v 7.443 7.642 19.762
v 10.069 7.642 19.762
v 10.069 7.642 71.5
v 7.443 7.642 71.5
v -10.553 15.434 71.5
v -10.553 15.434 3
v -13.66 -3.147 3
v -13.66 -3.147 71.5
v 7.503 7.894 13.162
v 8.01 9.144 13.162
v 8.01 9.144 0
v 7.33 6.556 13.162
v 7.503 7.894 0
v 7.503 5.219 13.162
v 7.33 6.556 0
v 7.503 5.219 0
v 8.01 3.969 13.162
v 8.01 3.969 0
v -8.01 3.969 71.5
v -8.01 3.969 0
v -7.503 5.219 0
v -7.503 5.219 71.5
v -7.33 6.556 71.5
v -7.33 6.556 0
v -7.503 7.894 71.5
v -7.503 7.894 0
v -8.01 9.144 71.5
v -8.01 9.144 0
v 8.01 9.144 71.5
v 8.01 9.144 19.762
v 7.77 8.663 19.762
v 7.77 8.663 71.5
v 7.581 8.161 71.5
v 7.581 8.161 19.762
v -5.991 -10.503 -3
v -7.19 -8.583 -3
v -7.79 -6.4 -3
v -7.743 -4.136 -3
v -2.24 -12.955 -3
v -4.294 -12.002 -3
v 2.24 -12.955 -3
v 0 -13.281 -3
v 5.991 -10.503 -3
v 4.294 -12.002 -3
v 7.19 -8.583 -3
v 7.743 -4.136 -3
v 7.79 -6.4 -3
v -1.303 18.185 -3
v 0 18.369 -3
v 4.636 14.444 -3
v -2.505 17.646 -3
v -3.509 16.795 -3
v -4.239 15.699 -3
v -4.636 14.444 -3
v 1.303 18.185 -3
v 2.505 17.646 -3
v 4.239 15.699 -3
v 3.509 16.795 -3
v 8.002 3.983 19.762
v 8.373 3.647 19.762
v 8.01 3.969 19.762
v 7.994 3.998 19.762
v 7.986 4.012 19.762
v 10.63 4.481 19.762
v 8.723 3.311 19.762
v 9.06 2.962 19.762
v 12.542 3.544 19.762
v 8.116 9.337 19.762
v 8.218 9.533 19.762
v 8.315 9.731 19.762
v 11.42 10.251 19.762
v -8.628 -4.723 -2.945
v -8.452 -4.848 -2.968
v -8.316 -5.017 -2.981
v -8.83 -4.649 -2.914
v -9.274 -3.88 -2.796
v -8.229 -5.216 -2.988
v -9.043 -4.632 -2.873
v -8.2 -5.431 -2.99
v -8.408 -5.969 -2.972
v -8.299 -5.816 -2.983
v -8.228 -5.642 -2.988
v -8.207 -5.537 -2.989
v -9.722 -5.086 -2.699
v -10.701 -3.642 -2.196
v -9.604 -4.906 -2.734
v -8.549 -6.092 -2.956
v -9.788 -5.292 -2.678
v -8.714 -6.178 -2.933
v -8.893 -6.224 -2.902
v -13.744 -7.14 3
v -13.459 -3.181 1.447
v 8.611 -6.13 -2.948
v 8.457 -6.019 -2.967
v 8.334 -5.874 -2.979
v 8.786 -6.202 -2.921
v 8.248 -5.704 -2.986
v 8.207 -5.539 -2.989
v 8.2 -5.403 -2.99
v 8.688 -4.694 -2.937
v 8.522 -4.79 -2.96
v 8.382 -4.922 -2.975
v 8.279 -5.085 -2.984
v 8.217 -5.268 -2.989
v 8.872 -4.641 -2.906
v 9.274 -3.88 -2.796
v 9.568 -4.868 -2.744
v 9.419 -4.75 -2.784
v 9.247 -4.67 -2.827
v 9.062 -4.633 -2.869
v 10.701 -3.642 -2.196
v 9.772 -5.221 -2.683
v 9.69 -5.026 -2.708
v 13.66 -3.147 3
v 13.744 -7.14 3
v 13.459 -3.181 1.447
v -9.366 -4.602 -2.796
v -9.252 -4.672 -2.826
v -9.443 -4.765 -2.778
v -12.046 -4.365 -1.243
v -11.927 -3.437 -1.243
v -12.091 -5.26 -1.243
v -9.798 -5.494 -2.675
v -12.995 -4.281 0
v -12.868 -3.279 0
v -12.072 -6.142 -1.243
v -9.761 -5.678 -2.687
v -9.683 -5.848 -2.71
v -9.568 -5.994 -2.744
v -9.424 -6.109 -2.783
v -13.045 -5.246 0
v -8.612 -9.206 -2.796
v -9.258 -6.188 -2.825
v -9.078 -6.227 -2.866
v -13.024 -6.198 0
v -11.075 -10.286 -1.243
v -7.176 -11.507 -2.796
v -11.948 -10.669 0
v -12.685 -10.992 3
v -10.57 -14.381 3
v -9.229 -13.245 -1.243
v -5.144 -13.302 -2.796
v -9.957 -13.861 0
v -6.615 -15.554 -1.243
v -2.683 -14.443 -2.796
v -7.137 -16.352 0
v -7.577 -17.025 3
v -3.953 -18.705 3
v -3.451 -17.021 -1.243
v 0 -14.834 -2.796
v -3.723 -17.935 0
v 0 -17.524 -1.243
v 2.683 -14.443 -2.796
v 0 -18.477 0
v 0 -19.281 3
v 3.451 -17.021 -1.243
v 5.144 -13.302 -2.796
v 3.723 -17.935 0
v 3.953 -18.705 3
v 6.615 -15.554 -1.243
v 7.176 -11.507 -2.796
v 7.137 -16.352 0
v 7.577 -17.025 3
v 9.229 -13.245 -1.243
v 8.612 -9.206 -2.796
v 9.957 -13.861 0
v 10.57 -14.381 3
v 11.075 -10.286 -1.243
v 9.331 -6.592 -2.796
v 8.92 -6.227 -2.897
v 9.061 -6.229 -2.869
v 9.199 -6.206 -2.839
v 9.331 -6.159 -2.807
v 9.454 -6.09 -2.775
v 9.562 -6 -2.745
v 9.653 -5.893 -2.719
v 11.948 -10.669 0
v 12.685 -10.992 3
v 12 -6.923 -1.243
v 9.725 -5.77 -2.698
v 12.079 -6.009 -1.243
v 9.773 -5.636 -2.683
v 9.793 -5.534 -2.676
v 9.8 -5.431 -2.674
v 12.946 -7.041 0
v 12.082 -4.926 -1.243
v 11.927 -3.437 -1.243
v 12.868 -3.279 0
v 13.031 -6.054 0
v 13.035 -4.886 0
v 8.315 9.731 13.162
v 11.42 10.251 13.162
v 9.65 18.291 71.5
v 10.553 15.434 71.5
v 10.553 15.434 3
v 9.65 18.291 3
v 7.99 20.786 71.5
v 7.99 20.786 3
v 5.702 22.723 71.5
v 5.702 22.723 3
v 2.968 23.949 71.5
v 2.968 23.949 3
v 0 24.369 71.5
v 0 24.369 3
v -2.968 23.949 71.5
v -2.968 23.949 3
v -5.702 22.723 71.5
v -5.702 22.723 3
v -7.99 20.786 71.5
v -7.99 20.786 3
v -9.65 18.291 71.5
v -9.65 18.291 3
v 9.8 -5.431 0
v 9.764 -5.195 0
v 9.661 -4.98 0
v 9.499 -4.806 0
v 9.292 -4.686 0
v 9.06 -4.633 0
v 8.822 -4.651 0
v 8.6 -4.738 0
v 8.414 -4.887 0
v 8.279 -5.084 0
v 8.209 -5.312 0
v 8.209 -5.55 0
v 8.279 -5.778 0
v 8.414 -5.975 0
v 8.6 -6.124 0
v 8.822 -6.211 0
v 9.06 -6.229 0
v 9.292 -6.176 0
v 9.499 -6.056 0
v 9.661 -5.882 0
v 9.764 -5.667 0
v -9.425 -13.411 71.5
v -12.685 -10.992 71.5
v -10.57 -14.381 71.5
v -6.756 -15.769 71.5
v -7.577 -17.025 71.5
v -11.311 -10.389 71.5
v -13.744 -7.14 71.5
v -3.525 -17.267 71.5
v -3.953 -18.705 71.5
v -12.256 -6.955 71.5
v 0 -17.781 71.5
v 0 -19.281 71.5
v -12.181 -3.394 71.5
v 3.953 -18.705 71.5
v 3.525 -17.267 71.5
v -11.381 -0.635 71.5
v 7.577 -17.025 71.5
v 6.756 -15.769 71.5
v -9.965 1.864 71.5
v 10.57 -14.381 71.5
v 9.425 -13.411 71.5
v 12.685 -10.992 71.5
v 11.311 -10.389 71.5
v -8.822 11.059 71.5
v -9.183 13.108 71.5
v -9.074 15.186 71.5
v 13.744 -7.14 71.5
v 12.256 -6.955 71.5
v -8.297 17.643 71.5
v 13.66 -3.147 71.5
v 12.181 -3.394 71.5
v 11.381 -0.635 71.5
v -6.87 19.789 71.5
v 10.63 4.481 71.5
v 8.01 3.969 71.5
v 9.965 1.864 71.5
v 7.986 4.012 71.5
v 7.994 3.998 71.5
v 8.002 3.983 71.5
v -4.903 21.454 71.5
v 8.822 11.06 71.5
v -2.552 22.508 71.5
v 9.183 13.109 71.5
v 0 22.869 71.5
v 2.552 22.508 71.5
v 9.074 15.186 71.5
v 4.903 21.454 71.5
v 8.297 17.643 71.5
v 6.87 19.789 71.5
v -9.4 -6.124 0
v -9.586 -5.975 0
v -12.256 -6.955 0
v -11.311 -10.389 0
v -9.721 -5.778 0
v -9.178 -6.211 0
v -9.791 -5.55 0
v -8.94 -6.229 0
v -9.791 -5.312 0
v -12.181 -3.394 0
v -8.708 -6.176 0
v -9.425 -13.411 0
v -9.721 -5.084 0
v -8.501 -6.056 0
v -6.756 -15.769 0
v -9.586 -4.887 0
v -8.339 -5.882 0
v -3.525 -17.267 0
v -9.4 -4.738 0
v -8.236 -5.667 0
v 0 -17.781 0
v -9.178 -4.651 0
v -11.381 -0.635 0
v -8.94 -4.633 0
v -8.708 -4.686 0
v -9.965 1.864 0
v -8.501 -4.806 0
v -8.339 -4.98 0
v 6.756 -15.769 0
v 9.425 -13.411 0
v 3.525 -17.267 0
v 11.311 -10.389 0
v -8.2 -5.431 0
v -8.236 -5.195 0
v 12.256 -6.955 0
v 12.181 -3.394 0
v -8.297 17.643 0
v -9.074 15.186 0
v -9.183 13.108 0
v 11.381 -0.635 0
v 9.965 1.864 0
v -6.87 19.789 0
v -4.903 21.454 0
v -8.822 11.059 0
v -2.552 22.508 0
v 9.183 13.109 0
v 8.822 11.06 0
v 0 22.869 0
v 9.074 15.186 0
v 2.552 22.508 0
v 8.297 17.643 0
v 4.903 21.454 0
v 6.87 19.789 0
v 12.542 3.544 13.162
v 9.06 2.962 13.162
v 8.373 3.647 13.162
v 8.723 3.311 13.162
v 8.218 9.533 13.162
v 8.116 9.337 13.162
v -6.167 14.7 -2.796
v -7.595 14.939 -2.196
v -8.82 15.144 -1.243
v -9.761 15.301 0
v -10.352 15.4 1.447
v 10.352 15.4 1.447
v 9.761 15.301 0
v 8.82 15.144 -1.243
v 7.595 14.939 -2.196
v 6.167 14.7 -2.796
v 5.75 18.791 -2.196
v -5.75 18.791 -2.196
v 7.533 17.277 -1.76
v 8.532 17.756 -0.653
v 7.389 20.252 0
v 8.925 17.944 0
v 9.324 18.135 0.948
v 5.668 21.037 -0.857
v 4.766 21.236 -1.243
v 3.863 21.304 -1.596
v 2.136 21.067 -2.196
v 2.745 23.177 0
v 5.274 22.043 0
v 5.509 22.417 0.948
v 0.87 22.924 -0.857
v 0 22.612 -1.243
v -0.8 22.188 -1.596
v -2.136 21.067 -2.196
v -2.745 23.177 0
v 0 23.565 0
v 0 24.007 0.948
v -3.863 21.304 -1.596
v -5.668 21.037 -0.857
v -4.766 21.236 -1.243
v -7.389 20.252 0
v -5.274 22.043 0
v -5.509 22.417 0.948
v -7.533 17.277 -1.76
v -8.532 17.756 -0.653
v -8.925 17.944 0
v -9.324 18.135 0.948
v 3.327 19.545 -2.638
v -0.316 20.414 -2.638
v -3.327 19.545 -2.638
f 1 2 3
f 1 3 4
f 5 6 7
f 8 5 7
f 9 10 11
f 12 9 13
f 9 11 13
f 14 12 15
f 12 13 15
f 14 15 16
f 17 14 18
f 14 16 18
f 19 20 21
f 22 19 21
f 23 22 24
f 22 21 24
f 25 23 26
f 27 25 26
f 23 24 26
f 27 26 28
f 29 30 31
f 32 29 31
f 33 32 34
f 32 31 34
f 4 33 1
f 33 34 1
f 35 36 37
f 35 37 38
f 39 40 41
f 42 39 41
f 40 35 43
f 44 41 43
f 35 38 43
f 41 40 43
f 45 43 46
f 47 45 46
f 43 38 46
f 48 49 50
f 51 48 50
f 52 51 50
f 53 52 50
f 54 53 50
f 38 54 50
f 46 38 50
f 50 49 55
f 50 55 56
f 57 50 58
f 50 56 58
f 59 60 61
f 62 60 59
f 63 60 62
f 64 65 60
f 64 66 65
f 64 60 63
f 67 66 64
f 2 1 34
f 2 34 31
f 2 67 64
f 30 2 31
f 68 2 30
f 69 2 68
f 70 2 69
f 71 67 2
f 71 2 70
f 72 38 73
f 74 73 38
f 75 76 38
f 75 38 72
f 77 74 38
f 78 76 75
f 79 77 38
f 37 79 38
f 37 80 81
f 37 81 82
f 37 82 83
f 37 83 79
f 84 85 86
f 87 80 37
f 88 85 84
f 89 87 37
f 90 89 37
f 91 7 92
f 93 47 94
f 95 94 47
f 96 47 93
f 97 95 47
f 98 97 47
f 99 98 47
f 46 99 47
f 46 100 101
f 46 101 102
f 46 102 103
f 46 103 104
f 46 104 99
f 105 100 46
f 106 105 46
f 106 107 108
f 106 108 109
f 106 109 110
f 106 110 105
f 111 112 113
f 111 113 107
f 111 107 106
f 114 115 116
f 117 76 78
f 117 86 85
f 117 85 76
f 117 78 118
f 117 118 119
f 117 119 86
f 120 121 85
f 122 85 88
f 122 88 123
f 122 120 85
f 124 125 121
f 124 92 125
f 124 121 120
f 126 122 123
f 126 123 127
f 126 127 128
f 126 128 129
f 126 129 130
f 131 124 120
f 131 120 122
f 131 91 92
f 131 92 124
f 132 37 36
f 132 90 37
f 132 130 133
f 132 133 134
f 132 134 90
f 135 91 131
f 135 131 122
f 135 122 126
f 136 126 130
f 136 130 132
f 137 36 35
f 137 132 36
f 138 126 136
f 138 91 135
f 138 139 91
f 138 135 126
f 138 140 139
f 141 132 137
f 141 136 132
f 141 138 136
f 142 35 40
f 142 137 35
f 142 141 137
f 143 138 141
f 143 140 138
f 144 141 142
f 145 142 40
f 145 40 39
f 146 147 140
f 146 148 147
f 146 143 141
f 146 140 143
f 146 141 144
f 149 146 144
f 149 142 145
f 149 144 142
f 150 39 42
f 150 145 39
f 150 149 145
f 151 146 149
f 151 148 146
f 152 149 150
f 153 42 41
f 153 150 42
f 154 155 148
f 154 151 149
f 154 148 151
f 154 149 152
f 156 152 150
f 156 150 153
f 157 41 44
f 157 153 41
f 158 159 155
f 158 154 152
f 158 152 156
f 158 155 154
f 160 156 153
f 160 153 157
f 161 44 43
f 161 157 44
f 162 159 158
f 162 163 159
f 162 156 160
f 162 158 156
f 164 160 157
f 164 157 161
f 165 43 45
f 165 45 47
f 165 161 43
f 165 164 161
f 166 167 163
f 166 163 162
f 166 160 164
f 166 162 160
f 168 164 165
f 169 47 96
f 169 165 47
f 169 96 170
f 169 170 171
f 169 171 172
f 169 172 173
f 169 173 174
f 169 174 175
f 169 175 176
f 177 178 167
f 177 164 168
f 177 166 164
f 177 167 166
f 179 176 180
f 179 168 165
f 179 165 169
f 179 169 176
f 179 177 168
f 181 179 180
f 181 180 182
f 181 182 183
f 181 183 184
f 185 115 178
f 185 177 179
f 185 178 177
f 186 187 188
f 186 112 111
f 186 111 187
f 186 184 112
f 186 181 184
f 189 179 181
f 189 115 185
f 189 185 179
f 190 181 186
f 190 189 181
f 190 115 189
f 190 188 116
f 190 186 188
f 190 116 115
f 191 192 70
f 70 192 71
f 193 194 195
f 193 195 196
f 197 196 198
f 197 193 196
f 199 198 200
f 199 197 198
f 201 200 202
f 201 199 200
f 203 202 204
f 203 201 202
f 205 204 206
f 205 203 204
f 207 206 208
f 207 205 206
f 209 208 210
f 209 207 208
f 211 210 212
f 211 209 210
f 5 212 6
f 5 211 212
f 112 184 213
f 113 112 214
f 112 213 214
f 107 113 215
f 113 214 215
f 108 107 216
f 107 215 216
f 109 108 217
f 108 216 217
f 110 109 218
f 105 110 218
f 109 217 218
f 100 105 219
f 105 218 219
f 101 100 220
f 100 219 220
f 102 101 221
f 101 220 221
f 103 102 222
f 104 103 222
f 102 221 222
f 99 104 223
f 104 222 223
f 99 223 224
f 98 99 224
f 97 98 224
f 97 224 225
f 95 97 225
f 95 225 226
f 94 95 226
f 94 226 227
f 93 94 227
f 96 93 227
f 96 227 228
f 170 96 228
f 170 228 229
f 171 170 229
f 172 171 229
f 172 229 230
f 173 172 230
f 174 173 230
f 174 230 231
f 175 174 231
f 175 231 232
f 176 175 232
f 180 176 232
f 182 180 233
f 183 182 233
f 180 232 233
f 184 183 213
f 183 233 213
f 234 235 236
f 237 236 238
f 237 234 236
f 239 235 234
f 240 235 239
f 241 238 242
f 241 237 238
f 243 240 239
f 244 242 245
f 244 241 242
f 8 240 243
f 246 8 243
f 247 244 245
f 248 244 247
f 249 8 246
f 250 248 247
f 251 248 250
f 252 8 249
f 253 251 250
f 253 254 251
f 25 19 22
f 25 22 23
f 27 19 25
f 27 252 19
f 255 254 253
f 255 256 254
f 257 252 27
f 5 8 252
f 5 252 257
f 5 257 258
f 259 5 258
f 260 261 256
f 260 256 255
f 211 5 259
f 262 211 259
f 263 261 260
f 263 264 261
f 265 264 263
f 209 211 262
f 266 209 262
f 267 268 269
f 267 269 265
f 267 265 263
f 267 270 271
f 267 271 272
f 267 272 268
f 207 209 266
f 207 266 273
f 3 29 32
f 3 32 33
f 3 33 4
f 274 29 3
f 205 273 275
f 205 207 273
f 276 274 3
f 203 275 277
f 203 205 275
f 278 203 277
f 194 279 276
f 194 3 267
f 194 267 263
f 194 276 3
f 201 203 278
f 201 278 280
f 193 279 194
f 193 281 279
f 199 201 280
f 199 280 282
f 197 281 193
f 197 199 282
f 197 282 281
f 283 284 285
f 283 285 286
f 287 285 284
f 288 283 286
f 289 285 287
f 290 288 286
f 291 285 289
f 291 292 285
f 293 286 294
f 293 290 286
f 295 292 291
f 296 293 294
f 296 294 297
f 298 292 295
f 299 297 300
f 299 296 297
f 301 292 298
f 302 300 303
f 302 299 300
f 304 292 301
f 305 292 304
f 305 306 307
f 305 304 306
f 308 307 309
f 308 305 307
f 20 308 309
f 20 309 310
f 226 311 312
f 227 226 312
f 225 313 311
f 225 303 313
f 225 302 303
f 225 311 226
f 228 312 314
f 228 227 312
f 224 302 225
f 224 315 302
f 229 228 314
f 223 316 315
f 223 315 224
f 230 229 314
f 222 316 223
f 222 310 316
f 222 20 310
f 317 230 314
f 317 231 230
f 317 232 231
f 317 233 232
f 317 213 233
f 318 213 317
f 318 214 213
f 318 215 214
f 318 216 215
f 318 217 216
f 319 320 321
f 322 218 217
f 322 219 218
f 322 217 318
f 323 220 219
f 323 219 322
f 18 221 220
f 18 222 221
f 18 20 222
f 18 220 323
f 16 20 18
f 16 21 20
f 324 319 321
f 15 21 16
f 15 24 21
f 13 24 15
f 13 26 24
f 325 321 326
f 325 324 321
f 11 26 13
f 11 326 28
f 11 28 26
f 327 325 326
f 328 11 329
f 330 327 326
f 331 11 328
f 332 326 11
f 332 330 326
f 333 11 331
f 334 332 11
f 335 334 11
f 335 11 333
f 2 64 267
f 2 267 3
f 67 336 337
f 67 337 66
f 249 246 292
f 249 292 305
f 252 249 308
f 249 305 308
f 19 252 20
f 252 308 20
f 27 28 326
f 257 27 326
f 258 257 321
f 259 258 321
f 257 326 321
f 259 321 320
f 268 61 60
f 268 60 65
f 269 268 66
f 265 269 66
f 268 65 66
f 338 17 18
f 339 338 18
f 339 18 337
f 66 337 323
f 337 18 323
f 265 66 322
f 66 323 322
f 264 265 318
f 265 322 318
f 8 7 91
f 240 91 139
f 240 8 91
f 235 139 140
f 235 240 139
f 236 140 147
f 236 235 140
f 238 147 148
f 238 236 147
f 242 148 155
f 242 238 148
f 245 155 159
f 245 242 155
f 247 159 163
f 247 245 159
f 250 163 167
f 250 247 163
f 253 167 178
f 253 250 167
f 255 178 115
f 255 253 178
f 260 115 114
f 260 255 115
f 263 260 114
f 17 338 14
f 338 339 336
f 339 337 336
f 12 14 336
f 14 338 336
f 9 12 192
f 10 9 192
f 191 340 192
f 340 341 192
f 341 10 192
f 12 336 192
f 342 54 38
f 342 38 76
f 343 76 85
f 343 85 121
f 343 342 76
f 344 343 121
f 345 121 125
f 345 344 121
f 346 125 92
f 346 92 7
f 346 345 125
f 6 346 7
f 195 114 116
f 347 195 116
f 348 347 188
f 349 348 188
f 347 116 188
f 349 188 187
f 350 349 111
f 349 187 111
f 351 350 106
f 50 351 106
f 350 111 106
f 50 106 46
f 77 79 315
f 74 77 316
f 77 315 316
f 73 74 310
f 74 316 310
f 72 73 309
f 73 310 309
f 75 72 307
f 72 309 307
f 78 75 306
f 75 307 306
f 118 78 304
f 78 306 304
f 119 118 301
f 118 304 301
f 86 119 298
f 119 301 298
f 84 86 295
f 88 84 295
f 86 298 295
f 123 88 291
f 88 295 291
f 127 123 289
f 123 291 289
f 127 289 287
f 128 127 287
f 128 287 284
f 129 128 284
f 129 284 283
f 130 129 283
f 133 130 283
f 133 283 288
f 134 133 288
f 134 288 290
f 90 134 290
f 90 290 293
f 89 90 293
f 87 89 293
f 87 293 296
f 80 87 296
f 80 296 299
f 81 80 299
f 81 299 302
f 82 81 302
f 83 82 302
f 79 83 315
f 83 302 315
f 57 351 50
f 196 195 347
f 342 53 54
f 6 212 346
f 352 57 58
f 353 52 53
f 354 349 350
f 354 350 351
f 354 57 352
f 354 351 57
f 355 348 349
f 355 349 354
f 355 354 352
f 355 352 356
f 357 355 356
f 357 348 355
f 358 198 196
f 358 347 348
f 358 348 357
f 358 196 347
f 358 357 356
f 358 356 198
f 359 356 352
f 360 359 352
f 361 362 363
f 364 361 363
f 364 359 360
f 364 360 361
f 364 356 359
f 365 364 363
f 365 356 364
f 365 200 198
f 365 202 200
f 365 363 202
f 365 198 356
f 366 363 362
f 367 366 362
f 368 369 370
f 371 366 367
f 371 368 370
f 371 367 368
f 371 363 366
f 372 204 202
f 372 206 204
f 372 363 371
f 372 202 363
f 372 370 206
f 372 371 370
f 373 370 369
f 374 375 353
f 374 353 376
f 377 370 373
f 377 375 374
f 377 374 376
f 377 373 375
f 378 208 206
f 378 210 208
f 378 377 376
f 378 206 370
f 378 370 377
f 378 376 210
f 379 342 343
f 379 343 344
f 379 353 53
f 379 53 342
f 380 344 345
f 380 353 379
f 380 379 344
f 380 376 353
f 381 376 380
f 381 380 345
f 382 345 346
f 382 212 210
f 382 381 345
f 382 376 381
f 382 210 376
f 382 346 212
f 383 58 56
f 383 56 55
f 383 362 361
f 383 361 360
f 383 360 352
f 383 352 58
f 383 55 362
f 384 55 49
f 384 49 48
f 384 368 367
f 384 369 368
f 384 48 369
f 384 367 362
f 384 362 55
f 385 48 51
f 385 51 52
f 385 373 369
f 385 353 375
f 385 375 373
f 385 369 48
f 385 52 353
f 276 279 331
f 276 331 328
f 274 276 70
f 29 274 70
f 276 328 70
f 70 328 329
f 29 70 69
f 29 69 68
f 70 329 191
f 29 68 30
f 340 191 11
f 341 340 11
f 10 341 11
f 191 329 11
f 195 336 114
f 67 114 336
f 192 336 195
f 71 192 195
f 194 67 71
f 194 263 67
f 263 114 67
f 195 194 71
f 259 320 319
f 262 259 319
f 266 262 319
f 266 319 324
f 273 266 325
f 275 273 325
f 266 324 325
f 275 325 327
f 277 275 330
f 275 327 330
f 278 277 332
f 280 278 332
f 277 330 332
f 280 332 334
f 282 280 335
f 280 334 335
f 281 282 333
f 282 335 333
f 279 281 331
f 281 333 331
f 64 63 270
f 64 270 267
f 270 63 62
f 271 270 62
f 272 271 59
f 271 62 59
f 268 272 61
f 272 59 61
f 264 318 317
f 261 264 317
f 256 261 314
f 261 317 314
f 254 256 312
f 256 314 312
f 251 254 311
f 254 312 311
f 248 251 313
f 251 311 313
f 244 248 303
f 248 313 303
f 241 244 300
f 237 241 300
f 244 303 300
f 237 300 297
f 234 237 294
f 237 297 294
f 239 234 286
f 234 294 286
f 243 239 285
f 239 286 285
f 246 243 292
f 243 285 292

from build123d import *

# Parameters (mm, degrees)
F1_DEPTH    = 71.5
F0_R        = 0.8
F2_DEPTH    = 3
F3_T1_DEPTH = 18.8384580048
F3_T3_DEPTH = 18.8384580048
F3_T6_ANGLE = 198.9853445977
F3_T8_ANGLE = 161.0146554023
F6_W        = 6.8
F6_H        = 6.6
F7_DEPTH    = 10
F9_DEPTH    = 57.4


# Not quite as in the source:
# - a fillet or chamfer that OpenCascade refuses, or shapes differently, is made with other operations: its cross-section is extruded or revolved along the edge and cut away or added


with BuildPart() as f1:
    # F0 (on Top) → F1 (new body)
    with BuildSketch(Plane.XY):
        with BuildLine():
            ThreePointArc((10.5534817095, 15.4336250836), (0, 24.3689653978), (-10.5534817095, 15.4336250836))
            Line((-10.5534817095, 15.4336250836), (-13.6603478203, -3.1468722986))
            ThreePointArc((-13.6603478203, -3.1468722986), (0, -19.2810346022), (13.6603478203, -3.1468722986))
            Line((13.6603478203, -3.1468722986), (10.5534817095, 15.4336250836))
        make_face()
        with BuildLine():
            ThreePointArc((-12.1808877675, -3.3942544975), (-10.7458713669, 0.6557337165), (-8.0101498113, 3.9689653978))
            ThreePointArc((-8.0101498113, 3.9689653978), (-7.3298242511, 6.556361809), (-8.0101498113, 9.1437582202))
            ThreePointArc((-8.0101498113, 9.1437582202), (-9.0606365073, 12.0737017575), (-9.0740216568, 15.1862428847))
            ThreePointArc((-9.0740216568, 15.1862428847), (0, 22.8689653978), (9.0740216568, 15.1862428847))
            ThreePointArc((9.0740216568, 15.1862428847), (9.0606535532, 12.0737985759), (8.0102465186, 9.1439294077))
            ThreePointArc((8.0102465186, 9.1439294077), (8.0101981654, 9.1438438137), (8.0101498113, 9.1437582202))
            ThreePointArc((8.0101498113, 9.1437582202), (7.3298242511, 6.556361809), (8.0101498113, 3.9689653978))
            ThreePointArc((8.0101498113, 3.9689653978), (10.7458713669, 0.6557337165), (12.1808877675, -3.3942544975))
            ThreePointArc((12.1808877675, -3.3942544975), (0, -17.7810346022), (-12.1808877675, -3.3942544975))
        make_face(mode=Mode.SUBTRACT)
    extrude(amount=F1_DEPTH)

    # F0 (on Top) → F2 (join)
    with BuildSketch(Plane.XY):
        with BuildLine():
            ThreePointArc((10.5534817095, 15.4336250836), (0, 24.3689653978), (-10.5534817095, 15.4336250836))
            Line((-10.5534817095, 15.4336250836), (-13.6603478203, -3.1468722986))
            ThreePointArc((-13.6603478203, -3.1468722986), (0, -19.2810346022), (13.6603478203, -3.1468722986))
            Line((13.6603478203, -3.1468722986), (10.5534817095, 15.4336250836))
        make_face()
        with BuildLine():
            ThreePointArc((-12.1808877675, -3.3942544975), (-10.7458713669, 0.6557337165), (-8.0101498113, 3.9689653978))
            ThreePointArc((-8.0101498113, 3.9689653978), (-7.3298242511, 6.556361809), (-8.0101498113, 9.1437582202))
            ThreePointArc((-8.0101498113, 9.1437582202), (-9.0606365073, 12.0737017575), (-9.0740216568, 15.1862428847))
            ThreePointArc((-9.0740216568, 15.1862428847), (0, 22.8689653978), (9.0740216568, 15.1862428847))
            ThreePointArc((9.0740216568, 15.1862428847), (9.0606535532, 12.0737985759), (8.0102465186, 9.1439294077))
            ThreePointArc((8.0102465186, 9.1439294077), (8.0101981654, 9.1438438137), (8.0101498113, 9.1437582202))
            ThreePointArc((8.0101498113, 9.1437582202), (7.3298242511, 6.556361809), (8.0101498113, 3.9689653978))
            ThreePointArc((8.0101498113, 3.9689653978), (10.7458713669, 0.6557337165), (12.1808877675, -3.3942544975))
            ThreePointArc((12.1808877675, -3.3942544975), (0, -17.7810346022), (-12.1808877675, -3.3942544975))
        make_face(mode=Mode.SUBTRACT)
        with BuildLine():
            ThreePointArc((-9.0740216568, 15.1862428847), (-9.0606365073, 12.0737017575), (-8.0101498113, 9.1437582202))
            ThreePointArc((-8.0101498113, 9.1437582202), (0, 4.4689653978), (8.0101498113, 9.1437582202))
            ThreePointArc((8.0101498113, 9.1437582202), (8.0101981654, 9.1438438137), (8.0102465186, 9.1439294077))
            ThreePointArc((8.0102465186, 9.1439294077), (9.0606535532, 12.0737985759), (9.0740216568, 15.1862428847))
            ThreePointArc((9.0740216568, 15.1862428847), (0, 22.8689653978), (-9.0740216568, 15.1862428847))
        make_face()
        with BuildLine():
            ThreePointArc((-8.0101498113, 9.1437582202), (-7.3298242511, 6.556361809), (-8.0101498113, 3.9689653978))
            Line((-8.0101498113, 3.9689653978), (8.0101498113, 3.9689653978))
            ThreePointArc((8.0101498113, 3.9689653978), (7.3298242511, 6.556361809), (8.0101498113, 9.1437582202))
            ThreePointArc((8.0101498113, 9.1437582202), (0, 4.4689653978), (-8.0101498113, 9.1437582202))
        make_face()
        with BuildLine():
            Line((8.0101498113, 3.9689653978), (-8.0101498113, 3.9689653978))
            ThreePointArc((-8.0101498113, 3.9689653978), (-10.7458713669, 0.6557337165), (-12.1808877675, -3.3942544975))
            ThreePointArc((-12.1808877675, -3.3942544975), (0, -17.7810346022), (12.1808877675, -3.3942544975))
            ThreePointArc((12.1808877675, -3.3942544975), (10.7458713669, 0.6557337165), (8.0101498113, 3.9689653978))
        make_face()
        with Locations((-9, -5.4310346022)):
            Circle(F0_R, mode=Mode.SUBTRACT)
        with Locations((9, -5.4310346022)):
            Circle(F0_R, mode=Mode.SUBTRACT)
    extrude(amount=-F2_DEPTH)

    # F3: fillet of radius 6 on 1 edges, made by hand

    # F3_s2 → F3_t1 (cut)
    with BuildSketch(Plane(origin=(2.22343693, 13.2971819786, 0), x_dir=(0, 0, 1), z_dir=(-0.164921466, -0.9863067018, 0))):
        with BuildLine():
            ThreePointArc((-3, 6.9543058117), (-1.2426406871, 11.1969464988), (3, 12.9543058117))
            Line((3, 12.9543058117), (-3, 12.9543058117))
            Line((-3, 12.9543058117), (-3, 6.9543058117))
        make_face()
    extrude(amount=F3_T1_DEPTH, mode=Mode.SUBTRACT)

    # F3_s4 → F3_t3 (cut)
    with BuildSketch(Plane(origin=(0.8834291807, -5.2833154036, 0), x_dir=(0, 0, 1), z_dir=(-0.164921466, 0.9863067018, 0))):
        with BuildLine():
            ThreePointArc((3, 12.9543058117), (-1.2426406871, 11.1969464988), (-3, 6.9543058117))
            Line((-3, 6.9543058117), (-3, 12.9543058117))
            Line((-3, 12.9543058117), (3, 12.9543058117))
        make_face()
    extrude(amount=F3_T3_DEPTH, mode=Mode.SUBTRACT)

    # F3_s5 → F3_t6 (revolve, cut)
    with BuildSketch(Plane(origin=(-0.8834291807, -5.2833154036, 0), x_dir=(0, 0, 1), z_dir=(0.164921466, 0.9863067018, 0))):
        with BuildLine():
            ThreePointArc((-3, -6.9543058117), (-1.2426406871, -11.1969464988), (3, -12.9543058117))
            Line((3, -12.9543058117), (-3, -12.9543058117))
            Line((-3, -12.9543058117), (-3, -6.9543058117))
        make_face()
    revolve(axis=Axis((0, -5.4310346022, -3), (0, 0, 1)), revolution_arc=F3_T6_ANGLE, mode=Mode.SUBTRACT)

    # F3_s7 → F3_t8 (revolve, cut)
    with BuildSketch(Plane(origin=(-2.22343693, 13.2971819786, 0), x_dir=(0, 0, 1), z_dir=(0.164921466, -0.9863067018, 0))):
        with BuildLine():
            ThreePointArc((-3, -6.9543058117), (-1.2426406871, -11.1969464988), (3, -12.9543058117))
            Line((3, -12.9543058117), (-3, -12.9543058117))
            Line((-3, -12.9543058117), (-3, -6.9543058117))
        make_face()
    revolve(axis=Axis((0, 13.6689653978, -3), (0, 0, 1)), revolution_arc=F3_T8_ANGLE, mode=Mode.SUBTRACT)

    # F6 (on face) → F7 (cut)
    with BuildSketch(Plane(origin=(12.7769186395, 2.1364431051, 0), x_dir=(-0.164921466, 0.9863067018, 0), z_dir=(0.9863067018, 0.164921466, 0))):
        with Locations((4.8267343795, 16.4621602923)):
            Rectangle(F6_W, F6_H)
    extrude(amount=-F7_DEPTH, mode=Mode.SUBTRACT)

    # F8 (on face) → F9 (cut)
    with BuildSketch(Plane.XY.offset(71.5)):
        with BuildLine():
            Line((10.0688748062, 7.6421294361), (7.4430989219, 7.6421294361))
            ThreePointArc((7.4430989219, 7.6421294361), (7.3876854798, 5.7782940298), (7.9859788071, 4.0122254677))
            Line((7.9859788071, 4.0122254677), (10.6296725571, 4.4812676497))
            Line((10.6296725571, 4.4812676497), (10.0688748062, 7.6421294361))
        make_face()
    extrude(amount=-F9_DEPTH, mode=Mode.SUBTRACT)


solid = f1.part
